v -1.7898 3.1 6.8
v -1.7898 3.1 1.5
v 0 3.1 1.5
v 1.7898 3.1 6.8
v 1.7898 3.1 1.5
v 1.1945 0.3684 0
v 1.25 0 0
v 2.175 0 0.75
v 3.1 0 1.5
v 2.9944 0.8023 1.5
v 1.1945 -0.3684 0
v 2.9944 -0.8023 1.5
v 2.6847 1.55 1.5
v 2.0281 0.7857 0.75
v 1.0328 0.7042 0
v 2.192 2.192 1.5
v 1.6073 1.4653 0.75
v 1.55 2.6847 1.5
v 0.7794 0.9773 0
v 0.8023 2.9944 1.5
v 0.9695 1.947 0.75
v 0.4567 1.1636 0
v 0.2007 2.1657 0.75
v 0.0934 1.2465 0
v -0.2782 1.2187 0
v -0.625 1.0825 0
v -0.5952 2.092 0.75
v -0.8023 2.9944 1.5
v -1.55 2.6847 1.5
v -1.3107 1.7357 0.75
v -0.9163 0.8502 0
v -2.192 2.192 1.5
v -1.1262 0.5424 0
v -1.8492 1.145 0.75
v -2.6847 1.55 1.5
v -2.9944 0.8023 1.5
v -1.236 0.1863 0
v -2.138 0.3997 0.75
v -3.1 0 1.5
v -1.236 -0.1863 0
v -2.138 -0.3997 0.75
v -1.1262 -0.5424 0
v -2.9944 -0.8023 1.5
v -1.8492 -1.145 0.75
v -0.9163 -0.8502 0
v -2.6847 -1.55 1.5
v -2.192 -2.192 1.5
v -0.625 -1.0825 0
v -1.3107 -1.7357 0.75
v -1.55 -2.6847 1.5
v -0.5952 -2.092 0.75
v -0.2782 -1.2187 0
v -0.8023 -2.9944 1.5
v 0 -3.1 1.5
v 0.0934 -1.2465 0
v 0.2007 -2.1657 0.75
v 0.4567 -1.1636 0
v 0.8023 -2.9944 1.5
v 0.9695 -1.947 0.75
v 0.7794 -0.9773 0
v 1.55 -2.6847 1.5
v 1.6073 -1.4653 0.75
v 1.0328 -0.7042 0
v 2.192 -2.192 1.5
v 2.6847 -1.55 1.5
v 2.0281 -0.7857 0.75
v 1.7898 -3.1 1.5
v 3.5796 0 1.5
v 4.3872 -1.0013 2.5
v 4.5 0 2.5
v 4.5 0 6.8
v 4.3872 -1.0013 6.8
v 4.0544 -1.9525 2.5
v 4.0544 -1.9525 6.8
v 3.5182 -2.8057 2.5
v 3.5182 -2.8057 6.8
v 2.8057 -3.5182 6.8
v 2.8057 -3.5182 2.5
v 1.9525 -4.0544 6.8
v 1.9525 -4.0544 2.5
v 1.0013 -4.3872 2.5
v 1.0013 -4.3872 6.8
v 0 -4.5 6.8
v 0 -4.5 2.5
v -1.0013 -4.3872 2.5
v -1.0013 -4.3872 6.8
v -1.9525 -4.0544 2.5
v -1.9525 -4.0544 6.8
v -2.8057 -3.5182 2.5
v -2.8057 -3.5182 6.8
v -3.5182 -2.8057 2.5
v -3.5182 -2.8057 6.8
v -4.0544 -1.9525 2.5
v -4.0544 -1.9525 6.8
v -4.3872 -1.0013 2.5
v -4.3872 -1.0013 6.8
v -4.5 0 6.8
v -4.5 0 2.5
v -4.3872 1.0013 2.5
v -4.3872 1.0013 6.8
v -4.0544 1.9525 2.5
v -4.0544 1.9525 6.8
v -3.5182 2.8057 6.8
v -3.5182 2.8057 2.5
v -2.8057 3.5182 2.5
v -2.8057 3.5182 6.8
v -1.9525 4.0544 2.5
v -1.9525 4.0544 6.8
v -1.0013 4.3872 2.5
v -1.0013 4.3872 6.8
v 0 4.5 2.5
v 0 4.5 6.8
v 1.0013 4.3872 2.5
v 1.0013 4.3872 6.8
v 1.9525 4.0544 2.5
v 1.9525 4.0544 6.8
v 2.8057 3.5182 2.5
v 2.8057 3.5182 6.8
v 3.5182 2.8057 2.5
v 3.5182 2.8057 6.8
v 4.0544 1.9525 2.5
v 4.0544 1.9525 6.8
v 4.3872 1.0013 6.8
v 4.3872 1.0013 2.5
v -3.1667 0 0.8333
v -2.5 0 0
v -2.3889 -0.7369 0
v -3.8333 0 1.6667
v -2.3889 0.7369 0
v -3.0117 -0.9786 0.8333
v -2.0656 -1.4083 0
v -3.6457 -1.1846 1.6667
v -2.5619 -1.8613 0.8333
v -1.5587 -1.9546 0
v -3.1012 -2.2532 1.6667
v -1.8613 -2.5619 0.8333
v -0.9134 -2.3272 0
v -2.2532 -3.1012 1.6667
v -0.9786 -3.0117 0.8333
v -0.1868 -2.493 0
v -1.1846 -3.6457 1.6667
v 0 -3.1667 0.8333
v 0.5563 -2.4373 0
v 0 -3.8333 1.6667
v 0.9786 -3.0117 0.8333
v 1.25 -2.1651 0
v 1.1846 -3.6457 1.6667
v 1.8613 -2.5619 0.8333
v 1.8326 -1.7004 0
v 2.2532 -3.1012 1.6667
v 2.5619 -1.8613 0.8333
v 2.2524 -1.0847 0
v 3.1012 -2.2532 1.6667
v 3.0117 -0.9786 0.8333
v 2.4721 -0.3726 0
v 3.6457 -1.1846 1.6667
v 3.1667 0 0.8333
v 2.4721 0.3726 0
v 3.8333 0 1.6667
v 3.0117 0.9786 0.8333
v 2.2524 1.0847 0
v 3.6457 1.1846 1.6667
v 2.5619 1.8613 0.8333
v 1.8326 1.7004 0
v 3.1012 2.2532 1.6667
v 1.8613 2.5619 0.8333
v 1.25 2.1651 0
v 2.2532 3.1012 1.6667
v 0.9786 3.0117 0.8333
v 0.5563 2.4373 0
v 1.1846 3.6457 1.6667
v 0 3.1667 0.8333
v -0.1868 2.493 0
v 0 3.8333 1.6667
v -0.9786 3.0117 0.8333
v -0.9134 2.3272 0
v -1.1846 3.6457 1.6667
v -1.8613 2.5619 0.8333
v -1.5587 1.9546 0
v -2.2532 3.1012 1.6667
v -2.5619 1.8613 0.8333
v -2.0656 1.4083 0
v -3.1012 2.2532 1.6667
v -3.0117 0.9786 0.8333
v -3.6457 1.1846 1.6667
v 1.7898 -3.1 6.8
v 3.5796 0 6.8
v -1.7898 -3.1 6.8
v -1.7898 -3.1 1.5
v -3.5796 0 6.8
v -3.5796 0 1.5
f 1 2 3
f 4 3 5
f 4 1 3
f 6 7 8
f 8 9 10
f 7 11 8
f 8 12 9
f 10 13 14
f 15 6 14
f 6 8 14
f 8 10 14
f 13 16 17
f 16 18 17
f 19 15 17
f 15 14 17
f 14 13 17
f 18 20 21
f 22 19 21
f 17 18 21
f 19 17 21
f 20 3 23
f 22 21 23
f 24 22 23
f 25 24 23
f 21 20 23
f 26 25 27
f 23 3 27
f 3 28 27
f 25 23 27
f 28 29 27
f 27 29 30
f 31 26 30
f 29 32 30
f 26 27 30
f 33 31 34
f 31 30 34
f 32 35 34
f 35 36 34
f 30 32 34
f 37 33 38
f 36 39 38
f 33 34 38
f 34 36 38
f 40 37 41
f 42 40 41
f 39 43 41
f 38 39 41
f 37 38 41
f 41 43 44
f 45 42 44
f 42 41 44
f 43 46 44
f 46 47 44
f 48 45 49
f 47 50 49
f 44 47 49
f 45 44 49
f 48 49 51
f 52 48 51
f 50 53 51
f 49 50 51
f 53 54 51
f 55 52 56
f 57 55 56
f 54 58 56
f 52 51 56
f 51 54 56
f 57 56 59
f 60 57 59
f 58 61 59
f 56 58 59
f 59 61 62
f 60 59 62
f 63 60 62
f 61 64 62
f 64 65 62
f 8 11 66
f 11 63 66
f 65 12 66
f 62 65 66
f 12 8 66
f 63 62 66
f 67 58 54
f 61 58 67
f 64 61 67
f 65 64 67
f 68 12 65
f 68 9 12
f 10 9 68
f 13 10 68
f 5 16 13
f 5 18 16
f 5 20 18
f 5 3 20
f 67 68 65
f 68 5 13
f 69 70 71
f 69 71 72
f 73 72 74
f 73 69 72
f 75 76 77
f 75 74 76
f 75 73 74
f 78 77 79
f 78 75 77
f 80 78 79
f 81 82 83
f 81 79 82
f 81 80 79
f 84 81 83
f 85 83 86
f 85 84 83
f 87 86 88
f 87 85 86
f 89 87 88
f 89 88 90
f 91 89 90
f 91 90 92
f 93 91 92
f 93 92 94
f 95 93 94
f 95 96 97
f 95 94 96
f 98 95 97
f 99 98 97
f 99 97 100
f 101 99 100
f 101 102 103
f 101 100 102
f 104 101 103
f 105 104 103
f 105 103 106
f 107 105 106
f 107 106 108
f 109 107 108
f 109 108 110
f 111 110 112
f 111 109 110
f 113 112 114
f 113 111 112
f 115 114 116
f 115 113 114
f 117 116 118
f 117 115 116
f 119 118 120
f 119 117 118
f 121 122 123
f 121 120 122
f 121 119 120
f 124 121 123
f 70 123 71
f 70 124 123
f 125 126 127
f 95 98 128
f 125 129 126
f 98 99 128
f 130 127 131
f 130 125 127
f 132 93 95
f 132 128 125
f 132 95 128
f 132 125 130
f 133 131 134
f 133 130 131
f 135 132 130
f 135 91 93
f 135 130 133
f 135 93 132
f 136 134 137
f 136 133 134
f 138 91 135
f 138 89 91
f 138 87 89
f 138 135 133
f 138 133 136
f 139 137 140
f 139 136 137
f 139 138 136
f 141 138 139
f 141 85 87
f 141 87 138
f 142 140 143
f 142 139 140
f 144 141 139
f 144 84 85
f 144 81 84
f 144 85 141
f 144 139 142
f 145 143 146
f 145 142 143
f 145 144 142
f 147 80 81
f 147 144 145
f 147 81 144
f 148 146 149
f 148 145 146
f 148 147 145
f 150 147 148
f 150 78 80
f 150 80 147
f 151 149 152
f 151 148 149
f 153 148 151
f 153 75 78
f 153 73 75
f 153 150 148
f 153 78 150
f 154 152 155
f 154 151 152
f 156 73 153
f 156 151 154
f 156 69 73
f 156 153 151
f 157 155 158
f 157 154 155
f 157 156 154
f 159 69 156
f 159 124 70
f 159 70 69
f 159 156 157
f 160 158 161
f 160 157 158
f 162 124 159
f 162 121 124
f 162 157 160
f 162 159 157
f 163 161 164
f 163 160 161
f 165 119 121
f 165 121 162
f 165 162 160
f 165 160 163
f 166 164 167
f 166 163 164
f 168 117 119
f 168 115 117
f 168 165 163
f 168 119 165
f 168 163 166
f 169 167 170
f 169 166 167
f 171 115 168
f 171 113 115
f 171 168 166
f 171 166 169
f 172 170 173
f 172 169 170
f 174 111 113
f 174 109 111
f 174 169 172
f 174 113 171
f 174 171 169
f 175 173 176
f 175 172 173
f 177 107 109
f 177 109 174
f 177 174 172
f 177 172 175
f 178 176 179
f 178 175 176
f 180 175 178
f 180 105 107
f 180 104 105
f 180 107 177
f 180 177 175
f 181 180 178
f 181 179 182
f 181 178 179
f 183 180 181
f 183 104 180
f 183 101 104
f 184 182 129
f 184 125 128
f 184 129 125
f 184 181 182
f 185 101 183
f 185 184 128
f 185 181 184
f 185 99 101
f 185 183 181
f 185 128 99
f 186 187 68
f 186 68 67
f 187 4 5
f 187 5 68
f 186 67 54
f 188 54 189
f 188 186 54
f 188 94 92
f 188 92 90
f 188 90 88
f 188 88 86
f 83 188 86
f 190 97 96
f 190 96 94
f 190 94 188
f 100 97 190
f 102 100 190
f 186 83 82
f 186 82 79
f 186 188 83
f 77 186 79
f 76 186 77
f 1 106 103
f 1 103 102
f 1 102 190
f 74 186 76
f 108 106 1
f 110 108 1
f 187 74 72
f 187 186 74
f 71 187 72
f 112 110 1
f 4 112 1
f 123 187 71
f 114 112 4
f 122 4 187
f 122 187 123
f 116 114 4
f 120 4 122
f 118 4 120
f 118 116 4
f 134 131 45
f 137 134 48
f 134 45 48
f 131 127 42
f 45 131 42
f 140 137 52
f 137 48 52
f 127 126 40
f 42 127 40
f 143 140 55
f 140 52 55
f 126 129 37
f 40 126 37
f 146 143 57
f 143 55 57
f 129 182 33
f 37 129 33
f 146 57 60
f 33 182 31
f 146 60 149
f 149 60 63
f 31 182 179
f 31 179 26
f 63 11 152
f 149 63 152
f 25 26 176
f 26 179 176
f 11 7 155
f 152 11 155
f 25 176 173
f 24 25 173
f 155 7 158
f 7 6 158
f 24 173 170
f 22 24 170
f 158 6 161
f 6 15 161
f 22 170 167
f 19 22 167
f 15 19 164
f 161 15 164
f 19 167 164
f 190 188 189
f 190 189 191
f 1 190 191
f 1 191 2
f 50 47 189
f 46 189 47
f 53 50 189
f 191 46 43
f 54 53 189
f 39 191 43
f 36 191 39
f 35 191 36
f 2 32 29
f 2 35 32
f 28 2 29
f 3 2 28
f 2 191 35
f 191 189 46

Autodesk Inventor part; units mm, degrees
ref_plane "YZ Plane" through (0, 0, 0) normal (1, 0, 0) x (0, 1, 0)
ref_plane "XZ Plane" through (0, 0, 0) normal (0, 1, 0) x (-1, 0, 0)
ref_plane "XY Plane" through (0, 0, 0) normal (0, 0, 1) x (1, 0, 0)
sketch "Sketch1" plane through (0, 0, 0) normal (0, 0, 1) x (1, 0, 0)
  circle A0 centre (0, 0) radius 4.5
  dimension "d0" = 9
extrude "Extrusion1" add sketch "Sketch1" along normal blind 6.8
sketch "Sketch2" plane through (0, 0, 6.8) normal (0, 0, 1) x (1, 0, 0)
  line L0 (-1.7898, 3.1) -> (1.7898, 3.1)
  line L1 (1.7898, 3.1) -> (3.5796, 0)
  line L2 (3.5796, 0) -> (1.7898, -3.1)
  line L3 (1.7898, -3.1) -> (-1.7898, -3.1)
  line L4 (-1.7898, -3.1) -> (-3.5796, 0)
  line L5 (-3.5796, 0) -> (-1.7898, 3.1)
  point P0 (0, 0)
  point P1 (0, 3.1)
  point P2 (0, -3.1)
  dimension "d3" = 6.2
  dimension "d4" = 6.2
extrude "Extrusion2" cut sketch "Sketch2" against normal blind 5.3
sketch "Sketch3" plane through (0, 0, 0) normal (0, 0, -1) x (-1, 0, 0)
  circle A0 centre (0, 0) radius 1.25
  dimension "d7" = 2.5
sketch "Sketch4" plane through (0, 0, 1.5) normal (0, 0, 1) x (1, 0, 0)
  circle A0 centre (0, 0) radius 3.1
  dimension "d8" = 6.2
loft "Loft1" cut profiles "Sketch4", "Sketch3"
sketch "Sketch5" plane through (0, 0, 0) normal (0, 1, 0) x (-1, 0, 0)
  line L0 (-4.5, 0) -> (4.5, 0) projected
  line L1 (2.5, 0) -> (4.5, 2.5)
  line L2 (4.5, 2.5) -> (4.5, 0)
  line L3 (4.5, 0) -> (2.5, 0)
  line L4 (0, -0.5) -> (0, 3) projected
  point P0 (0, 0)
  dimension "d14" = 2.5
  dimension "d15" = 2
revolve "Revolution1" cut sketch "Sketch5" angle 360 about axis through (0, 0, -10) along (0, 0, 1)
equation "\"d4\" = d3"
properties part number "mouthcover"
